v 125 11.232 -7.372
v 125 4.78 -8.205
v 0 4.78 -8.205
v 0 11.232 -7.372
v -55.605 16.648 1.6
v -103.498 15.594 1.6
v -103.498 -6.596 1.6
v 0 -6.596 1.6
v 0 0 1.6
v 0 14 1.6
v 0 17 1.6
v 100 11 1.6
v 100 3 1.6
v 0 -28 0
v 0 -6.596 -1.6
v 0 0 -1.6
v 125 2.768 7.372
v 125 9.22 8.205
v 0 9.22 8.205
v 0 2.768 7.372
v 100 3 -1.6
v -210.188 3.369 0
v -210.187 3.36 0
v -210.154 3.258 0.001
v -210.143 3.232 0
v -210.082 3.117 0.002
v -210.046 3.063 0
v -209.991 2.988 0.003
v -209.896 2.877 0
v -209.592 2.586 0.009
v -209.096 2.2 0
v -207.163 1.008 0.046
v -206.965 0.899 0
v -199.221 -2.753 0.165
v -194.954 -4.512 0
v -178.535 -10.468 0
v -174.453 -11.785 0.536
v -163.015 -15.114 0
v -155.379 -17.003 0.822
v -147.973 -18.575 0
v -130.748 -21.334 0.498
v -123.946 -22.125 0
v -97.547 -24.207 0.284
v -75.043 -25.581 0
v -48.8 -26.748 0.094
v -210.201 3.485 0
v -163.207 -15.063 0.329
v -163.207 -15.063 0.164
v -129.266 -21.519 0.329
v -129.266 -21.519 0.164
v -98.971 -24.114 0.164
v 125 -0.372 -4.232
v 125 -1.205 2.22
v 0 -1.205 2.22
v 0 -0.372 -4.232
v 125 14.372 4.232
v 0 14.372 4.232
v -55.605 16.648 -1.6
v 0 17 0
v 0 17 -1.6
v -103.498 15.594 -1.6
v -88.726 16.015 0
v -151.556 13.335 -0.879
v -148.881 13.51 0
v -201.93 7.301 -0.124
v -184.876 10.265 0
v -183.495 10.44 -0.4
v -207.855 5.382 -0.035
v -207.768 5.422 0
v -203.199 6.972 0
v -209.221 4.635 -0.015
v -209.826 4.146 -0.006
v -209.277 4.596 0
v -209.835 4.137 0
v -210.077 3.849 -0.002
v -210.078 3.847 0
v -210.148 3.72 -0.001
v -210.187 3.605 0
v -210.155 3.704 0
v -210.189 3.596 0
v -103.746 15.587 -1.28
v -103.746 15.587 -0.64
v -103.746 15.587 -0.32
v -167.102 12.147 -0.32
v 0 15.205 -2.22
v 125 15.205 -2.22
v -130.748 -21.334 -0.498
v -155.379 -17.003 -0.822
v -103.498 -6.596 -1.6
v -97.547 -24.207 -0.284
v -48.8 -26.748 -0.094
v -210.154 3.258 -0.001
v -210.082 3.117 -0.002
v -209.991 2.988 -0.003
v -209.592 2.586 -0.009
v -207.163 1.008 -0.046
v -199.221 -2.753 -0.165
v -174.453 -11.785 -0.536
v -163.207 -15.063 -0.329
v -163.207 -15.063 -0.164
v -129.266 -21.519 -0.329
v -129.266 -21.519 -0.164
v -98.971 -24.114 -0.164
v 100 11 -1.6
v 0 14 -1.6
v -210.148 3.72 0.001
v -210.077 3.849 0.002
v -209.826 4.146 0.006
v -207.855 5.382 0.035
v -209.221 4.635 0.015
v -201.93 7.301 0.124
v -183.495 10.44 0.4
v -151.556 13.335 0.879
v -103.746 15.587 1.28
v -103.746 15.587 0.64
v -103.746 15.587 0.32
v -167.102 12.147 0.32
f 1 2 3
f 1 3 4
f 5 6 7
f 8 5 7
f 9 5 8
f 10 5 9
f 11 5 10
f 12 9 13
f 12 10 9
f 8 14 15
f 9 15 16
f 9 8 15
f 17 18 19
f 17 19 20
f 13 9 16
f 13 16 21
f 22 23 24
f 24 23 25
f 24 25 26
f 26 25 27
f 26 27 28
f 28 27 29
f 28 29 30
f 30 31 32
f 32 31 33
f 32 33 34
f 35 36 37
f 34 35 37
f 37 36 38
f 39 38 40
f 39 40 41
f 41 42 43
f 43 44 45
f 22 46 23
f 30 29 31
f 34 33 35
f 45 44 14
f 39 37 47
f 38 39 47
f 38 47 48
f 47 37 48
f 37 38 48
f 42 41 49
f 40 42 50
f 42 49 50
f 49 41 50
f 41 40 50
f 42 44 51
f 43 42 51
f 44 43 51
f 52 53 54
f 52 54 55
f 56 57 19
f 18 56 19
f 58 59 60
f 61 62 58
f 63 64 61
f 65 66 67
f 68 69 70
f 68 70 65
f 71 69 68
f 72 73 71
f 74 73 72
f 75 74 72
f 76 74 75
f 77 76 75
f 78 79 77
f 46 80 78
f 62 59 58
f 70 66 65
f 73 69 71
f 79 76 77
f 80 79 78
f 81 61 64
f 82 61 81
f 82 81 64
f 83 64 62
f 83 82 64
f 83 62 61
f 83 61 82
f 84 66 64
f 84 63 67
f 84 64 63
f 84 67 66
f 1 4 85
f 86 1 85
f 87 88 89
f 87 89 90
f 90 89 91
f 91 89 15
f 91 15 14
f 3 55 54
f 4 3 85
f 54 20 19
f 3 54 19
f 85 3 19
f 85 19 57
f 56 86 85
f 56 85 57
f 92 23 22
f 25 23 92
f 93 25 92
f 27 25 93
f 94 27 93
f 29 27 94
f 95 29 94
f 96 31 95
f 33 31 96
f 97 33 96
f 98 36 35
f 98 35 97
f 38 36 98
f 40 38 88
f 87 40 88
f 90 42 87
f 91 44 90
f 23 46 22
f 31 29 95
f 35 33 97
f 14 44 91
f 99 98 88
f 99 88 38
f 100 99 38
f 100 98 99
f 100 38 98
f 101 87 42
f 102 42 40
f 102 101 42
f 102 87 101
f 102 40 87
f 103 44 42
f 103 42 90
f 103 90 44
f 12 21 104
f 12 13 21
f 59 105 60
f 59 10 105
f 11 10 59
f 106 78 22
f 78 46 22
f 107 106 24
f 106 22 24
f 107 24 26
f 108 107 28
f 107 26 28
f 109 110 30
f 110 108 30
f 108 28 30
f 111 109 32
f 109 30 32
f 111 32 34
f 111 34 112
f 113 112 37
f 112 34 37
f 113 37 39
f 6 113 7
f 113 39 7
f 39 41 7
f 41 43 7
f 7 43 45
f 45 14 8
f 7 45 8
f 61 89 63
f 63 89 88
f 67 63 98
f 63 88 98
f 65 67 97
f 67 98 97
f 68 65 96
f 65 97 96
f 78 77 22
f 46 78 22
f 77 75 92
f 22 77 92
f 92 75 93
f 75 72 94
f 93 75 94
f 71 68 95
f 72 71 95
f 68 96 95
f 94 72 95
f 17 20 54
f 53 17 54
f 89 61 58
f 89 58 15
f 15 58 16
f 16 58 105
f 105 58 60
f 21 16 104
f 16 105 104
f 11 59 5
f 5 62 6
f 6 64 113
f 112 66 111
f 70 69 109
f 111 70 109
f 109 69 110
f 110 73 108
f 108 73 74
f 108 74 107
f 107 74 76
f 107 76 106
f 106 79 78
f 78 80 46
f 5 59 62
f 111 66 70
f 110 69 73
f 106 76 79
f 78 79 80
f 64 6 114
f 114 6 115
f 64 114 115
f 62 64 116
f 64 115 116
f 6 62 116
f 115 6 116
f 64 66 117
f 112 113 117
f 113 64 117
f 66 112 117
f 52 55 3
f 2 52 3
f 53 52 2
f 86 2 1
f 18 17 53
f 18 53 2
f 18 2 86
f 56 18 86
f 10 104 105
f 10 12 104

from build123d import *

# Parameters (mm, degrees)
F1_DEPTH = 1.6
F3_DEPTH = 210.2019293582
F5_DEPTH = 30
F7_DEPTH = 125


with BuildPart() as f1:
    # F0 (on Top) → F1 (new body, symmetric)
    with BuildSketch(Plane.XY):
        with BuildLine():
            Line((0, 14), (0, 17))
            add(Edge.make_bspline(
                [(0, 17), (-169.40086329, 17), (-208.7559604407, 7.7993667343), (-211.0354385147, 1.4108706831), (-157.7108088282, -20.2400259269), (-92.1005586774, -24.5817541259), (-54.5433768682, -27), (0, -28)],
                knots=[0, 0, 0, 0, 0.3573007619, 0.3819446975, 0.5564144399, 0.7548280711, 1, 1, 1, 1], degree=3))
            Line((0, -28), (0, 0))
            Line((0, 0), (100, 3))
            Line((100, 3), (100, 11))
            Line((100, 11), (0, 14))
        make_face()
    extrude(amount=F1_DEPTH, both=True)

    # F2 (on face) → F3 (cut, through all)
    with BuildSketch(Plane.YZ):
        Polygon((-6.5955766477, -1.6), (-28, 0), (-6.5955766477, 1.6), (-6.5955766477, 8.5014778621), (-41.2709554795, 6.9573632517), (-40.3350554407, -14.059657231), (-6.5955766477, -11.1044486313), align=None)
    extrude(amount=-F3_DEPTH, mode=Mode.SUBTRACT)

    # F4 (on Front) → F5 (cut, symmetric)
    with BuildSketch(Plane.XZ):
        Polygon((-210.2009290436, 0), (-103.4982353449, 1.6), (-103.4982353449, 23.7350686695), (-239.4033678663, 23.7350686695), (-238.3585423231, -17.7917070687), (-103.4982353449, -14.398583211), (-103.4982353449, -1.6), align=None)
    extrude(amount=F5_DEPTH, both=True, mode=Mode.SUBTRACT)


with BuildPart() as f7:
    # F6 (on Right) → F7 (new body)
    with BuildSketch(Plane.YZ):
        Polygon((15.2049313741, -2.2201579103), (14.3716513275, 4.2318739001), (9.2201579103, 8.2049313741), (2.7681260999, 7.3716513275), (-1.2049313741, 2.2201579103), (-0.3716513275, -4.2318739001), (4.7798420897, -8.2049313741), (11.2318739001, -7.3716513275), align=None)
    extrude(amount=F7_DEPTH)


solid = Compound([f1.part, f7.part])
